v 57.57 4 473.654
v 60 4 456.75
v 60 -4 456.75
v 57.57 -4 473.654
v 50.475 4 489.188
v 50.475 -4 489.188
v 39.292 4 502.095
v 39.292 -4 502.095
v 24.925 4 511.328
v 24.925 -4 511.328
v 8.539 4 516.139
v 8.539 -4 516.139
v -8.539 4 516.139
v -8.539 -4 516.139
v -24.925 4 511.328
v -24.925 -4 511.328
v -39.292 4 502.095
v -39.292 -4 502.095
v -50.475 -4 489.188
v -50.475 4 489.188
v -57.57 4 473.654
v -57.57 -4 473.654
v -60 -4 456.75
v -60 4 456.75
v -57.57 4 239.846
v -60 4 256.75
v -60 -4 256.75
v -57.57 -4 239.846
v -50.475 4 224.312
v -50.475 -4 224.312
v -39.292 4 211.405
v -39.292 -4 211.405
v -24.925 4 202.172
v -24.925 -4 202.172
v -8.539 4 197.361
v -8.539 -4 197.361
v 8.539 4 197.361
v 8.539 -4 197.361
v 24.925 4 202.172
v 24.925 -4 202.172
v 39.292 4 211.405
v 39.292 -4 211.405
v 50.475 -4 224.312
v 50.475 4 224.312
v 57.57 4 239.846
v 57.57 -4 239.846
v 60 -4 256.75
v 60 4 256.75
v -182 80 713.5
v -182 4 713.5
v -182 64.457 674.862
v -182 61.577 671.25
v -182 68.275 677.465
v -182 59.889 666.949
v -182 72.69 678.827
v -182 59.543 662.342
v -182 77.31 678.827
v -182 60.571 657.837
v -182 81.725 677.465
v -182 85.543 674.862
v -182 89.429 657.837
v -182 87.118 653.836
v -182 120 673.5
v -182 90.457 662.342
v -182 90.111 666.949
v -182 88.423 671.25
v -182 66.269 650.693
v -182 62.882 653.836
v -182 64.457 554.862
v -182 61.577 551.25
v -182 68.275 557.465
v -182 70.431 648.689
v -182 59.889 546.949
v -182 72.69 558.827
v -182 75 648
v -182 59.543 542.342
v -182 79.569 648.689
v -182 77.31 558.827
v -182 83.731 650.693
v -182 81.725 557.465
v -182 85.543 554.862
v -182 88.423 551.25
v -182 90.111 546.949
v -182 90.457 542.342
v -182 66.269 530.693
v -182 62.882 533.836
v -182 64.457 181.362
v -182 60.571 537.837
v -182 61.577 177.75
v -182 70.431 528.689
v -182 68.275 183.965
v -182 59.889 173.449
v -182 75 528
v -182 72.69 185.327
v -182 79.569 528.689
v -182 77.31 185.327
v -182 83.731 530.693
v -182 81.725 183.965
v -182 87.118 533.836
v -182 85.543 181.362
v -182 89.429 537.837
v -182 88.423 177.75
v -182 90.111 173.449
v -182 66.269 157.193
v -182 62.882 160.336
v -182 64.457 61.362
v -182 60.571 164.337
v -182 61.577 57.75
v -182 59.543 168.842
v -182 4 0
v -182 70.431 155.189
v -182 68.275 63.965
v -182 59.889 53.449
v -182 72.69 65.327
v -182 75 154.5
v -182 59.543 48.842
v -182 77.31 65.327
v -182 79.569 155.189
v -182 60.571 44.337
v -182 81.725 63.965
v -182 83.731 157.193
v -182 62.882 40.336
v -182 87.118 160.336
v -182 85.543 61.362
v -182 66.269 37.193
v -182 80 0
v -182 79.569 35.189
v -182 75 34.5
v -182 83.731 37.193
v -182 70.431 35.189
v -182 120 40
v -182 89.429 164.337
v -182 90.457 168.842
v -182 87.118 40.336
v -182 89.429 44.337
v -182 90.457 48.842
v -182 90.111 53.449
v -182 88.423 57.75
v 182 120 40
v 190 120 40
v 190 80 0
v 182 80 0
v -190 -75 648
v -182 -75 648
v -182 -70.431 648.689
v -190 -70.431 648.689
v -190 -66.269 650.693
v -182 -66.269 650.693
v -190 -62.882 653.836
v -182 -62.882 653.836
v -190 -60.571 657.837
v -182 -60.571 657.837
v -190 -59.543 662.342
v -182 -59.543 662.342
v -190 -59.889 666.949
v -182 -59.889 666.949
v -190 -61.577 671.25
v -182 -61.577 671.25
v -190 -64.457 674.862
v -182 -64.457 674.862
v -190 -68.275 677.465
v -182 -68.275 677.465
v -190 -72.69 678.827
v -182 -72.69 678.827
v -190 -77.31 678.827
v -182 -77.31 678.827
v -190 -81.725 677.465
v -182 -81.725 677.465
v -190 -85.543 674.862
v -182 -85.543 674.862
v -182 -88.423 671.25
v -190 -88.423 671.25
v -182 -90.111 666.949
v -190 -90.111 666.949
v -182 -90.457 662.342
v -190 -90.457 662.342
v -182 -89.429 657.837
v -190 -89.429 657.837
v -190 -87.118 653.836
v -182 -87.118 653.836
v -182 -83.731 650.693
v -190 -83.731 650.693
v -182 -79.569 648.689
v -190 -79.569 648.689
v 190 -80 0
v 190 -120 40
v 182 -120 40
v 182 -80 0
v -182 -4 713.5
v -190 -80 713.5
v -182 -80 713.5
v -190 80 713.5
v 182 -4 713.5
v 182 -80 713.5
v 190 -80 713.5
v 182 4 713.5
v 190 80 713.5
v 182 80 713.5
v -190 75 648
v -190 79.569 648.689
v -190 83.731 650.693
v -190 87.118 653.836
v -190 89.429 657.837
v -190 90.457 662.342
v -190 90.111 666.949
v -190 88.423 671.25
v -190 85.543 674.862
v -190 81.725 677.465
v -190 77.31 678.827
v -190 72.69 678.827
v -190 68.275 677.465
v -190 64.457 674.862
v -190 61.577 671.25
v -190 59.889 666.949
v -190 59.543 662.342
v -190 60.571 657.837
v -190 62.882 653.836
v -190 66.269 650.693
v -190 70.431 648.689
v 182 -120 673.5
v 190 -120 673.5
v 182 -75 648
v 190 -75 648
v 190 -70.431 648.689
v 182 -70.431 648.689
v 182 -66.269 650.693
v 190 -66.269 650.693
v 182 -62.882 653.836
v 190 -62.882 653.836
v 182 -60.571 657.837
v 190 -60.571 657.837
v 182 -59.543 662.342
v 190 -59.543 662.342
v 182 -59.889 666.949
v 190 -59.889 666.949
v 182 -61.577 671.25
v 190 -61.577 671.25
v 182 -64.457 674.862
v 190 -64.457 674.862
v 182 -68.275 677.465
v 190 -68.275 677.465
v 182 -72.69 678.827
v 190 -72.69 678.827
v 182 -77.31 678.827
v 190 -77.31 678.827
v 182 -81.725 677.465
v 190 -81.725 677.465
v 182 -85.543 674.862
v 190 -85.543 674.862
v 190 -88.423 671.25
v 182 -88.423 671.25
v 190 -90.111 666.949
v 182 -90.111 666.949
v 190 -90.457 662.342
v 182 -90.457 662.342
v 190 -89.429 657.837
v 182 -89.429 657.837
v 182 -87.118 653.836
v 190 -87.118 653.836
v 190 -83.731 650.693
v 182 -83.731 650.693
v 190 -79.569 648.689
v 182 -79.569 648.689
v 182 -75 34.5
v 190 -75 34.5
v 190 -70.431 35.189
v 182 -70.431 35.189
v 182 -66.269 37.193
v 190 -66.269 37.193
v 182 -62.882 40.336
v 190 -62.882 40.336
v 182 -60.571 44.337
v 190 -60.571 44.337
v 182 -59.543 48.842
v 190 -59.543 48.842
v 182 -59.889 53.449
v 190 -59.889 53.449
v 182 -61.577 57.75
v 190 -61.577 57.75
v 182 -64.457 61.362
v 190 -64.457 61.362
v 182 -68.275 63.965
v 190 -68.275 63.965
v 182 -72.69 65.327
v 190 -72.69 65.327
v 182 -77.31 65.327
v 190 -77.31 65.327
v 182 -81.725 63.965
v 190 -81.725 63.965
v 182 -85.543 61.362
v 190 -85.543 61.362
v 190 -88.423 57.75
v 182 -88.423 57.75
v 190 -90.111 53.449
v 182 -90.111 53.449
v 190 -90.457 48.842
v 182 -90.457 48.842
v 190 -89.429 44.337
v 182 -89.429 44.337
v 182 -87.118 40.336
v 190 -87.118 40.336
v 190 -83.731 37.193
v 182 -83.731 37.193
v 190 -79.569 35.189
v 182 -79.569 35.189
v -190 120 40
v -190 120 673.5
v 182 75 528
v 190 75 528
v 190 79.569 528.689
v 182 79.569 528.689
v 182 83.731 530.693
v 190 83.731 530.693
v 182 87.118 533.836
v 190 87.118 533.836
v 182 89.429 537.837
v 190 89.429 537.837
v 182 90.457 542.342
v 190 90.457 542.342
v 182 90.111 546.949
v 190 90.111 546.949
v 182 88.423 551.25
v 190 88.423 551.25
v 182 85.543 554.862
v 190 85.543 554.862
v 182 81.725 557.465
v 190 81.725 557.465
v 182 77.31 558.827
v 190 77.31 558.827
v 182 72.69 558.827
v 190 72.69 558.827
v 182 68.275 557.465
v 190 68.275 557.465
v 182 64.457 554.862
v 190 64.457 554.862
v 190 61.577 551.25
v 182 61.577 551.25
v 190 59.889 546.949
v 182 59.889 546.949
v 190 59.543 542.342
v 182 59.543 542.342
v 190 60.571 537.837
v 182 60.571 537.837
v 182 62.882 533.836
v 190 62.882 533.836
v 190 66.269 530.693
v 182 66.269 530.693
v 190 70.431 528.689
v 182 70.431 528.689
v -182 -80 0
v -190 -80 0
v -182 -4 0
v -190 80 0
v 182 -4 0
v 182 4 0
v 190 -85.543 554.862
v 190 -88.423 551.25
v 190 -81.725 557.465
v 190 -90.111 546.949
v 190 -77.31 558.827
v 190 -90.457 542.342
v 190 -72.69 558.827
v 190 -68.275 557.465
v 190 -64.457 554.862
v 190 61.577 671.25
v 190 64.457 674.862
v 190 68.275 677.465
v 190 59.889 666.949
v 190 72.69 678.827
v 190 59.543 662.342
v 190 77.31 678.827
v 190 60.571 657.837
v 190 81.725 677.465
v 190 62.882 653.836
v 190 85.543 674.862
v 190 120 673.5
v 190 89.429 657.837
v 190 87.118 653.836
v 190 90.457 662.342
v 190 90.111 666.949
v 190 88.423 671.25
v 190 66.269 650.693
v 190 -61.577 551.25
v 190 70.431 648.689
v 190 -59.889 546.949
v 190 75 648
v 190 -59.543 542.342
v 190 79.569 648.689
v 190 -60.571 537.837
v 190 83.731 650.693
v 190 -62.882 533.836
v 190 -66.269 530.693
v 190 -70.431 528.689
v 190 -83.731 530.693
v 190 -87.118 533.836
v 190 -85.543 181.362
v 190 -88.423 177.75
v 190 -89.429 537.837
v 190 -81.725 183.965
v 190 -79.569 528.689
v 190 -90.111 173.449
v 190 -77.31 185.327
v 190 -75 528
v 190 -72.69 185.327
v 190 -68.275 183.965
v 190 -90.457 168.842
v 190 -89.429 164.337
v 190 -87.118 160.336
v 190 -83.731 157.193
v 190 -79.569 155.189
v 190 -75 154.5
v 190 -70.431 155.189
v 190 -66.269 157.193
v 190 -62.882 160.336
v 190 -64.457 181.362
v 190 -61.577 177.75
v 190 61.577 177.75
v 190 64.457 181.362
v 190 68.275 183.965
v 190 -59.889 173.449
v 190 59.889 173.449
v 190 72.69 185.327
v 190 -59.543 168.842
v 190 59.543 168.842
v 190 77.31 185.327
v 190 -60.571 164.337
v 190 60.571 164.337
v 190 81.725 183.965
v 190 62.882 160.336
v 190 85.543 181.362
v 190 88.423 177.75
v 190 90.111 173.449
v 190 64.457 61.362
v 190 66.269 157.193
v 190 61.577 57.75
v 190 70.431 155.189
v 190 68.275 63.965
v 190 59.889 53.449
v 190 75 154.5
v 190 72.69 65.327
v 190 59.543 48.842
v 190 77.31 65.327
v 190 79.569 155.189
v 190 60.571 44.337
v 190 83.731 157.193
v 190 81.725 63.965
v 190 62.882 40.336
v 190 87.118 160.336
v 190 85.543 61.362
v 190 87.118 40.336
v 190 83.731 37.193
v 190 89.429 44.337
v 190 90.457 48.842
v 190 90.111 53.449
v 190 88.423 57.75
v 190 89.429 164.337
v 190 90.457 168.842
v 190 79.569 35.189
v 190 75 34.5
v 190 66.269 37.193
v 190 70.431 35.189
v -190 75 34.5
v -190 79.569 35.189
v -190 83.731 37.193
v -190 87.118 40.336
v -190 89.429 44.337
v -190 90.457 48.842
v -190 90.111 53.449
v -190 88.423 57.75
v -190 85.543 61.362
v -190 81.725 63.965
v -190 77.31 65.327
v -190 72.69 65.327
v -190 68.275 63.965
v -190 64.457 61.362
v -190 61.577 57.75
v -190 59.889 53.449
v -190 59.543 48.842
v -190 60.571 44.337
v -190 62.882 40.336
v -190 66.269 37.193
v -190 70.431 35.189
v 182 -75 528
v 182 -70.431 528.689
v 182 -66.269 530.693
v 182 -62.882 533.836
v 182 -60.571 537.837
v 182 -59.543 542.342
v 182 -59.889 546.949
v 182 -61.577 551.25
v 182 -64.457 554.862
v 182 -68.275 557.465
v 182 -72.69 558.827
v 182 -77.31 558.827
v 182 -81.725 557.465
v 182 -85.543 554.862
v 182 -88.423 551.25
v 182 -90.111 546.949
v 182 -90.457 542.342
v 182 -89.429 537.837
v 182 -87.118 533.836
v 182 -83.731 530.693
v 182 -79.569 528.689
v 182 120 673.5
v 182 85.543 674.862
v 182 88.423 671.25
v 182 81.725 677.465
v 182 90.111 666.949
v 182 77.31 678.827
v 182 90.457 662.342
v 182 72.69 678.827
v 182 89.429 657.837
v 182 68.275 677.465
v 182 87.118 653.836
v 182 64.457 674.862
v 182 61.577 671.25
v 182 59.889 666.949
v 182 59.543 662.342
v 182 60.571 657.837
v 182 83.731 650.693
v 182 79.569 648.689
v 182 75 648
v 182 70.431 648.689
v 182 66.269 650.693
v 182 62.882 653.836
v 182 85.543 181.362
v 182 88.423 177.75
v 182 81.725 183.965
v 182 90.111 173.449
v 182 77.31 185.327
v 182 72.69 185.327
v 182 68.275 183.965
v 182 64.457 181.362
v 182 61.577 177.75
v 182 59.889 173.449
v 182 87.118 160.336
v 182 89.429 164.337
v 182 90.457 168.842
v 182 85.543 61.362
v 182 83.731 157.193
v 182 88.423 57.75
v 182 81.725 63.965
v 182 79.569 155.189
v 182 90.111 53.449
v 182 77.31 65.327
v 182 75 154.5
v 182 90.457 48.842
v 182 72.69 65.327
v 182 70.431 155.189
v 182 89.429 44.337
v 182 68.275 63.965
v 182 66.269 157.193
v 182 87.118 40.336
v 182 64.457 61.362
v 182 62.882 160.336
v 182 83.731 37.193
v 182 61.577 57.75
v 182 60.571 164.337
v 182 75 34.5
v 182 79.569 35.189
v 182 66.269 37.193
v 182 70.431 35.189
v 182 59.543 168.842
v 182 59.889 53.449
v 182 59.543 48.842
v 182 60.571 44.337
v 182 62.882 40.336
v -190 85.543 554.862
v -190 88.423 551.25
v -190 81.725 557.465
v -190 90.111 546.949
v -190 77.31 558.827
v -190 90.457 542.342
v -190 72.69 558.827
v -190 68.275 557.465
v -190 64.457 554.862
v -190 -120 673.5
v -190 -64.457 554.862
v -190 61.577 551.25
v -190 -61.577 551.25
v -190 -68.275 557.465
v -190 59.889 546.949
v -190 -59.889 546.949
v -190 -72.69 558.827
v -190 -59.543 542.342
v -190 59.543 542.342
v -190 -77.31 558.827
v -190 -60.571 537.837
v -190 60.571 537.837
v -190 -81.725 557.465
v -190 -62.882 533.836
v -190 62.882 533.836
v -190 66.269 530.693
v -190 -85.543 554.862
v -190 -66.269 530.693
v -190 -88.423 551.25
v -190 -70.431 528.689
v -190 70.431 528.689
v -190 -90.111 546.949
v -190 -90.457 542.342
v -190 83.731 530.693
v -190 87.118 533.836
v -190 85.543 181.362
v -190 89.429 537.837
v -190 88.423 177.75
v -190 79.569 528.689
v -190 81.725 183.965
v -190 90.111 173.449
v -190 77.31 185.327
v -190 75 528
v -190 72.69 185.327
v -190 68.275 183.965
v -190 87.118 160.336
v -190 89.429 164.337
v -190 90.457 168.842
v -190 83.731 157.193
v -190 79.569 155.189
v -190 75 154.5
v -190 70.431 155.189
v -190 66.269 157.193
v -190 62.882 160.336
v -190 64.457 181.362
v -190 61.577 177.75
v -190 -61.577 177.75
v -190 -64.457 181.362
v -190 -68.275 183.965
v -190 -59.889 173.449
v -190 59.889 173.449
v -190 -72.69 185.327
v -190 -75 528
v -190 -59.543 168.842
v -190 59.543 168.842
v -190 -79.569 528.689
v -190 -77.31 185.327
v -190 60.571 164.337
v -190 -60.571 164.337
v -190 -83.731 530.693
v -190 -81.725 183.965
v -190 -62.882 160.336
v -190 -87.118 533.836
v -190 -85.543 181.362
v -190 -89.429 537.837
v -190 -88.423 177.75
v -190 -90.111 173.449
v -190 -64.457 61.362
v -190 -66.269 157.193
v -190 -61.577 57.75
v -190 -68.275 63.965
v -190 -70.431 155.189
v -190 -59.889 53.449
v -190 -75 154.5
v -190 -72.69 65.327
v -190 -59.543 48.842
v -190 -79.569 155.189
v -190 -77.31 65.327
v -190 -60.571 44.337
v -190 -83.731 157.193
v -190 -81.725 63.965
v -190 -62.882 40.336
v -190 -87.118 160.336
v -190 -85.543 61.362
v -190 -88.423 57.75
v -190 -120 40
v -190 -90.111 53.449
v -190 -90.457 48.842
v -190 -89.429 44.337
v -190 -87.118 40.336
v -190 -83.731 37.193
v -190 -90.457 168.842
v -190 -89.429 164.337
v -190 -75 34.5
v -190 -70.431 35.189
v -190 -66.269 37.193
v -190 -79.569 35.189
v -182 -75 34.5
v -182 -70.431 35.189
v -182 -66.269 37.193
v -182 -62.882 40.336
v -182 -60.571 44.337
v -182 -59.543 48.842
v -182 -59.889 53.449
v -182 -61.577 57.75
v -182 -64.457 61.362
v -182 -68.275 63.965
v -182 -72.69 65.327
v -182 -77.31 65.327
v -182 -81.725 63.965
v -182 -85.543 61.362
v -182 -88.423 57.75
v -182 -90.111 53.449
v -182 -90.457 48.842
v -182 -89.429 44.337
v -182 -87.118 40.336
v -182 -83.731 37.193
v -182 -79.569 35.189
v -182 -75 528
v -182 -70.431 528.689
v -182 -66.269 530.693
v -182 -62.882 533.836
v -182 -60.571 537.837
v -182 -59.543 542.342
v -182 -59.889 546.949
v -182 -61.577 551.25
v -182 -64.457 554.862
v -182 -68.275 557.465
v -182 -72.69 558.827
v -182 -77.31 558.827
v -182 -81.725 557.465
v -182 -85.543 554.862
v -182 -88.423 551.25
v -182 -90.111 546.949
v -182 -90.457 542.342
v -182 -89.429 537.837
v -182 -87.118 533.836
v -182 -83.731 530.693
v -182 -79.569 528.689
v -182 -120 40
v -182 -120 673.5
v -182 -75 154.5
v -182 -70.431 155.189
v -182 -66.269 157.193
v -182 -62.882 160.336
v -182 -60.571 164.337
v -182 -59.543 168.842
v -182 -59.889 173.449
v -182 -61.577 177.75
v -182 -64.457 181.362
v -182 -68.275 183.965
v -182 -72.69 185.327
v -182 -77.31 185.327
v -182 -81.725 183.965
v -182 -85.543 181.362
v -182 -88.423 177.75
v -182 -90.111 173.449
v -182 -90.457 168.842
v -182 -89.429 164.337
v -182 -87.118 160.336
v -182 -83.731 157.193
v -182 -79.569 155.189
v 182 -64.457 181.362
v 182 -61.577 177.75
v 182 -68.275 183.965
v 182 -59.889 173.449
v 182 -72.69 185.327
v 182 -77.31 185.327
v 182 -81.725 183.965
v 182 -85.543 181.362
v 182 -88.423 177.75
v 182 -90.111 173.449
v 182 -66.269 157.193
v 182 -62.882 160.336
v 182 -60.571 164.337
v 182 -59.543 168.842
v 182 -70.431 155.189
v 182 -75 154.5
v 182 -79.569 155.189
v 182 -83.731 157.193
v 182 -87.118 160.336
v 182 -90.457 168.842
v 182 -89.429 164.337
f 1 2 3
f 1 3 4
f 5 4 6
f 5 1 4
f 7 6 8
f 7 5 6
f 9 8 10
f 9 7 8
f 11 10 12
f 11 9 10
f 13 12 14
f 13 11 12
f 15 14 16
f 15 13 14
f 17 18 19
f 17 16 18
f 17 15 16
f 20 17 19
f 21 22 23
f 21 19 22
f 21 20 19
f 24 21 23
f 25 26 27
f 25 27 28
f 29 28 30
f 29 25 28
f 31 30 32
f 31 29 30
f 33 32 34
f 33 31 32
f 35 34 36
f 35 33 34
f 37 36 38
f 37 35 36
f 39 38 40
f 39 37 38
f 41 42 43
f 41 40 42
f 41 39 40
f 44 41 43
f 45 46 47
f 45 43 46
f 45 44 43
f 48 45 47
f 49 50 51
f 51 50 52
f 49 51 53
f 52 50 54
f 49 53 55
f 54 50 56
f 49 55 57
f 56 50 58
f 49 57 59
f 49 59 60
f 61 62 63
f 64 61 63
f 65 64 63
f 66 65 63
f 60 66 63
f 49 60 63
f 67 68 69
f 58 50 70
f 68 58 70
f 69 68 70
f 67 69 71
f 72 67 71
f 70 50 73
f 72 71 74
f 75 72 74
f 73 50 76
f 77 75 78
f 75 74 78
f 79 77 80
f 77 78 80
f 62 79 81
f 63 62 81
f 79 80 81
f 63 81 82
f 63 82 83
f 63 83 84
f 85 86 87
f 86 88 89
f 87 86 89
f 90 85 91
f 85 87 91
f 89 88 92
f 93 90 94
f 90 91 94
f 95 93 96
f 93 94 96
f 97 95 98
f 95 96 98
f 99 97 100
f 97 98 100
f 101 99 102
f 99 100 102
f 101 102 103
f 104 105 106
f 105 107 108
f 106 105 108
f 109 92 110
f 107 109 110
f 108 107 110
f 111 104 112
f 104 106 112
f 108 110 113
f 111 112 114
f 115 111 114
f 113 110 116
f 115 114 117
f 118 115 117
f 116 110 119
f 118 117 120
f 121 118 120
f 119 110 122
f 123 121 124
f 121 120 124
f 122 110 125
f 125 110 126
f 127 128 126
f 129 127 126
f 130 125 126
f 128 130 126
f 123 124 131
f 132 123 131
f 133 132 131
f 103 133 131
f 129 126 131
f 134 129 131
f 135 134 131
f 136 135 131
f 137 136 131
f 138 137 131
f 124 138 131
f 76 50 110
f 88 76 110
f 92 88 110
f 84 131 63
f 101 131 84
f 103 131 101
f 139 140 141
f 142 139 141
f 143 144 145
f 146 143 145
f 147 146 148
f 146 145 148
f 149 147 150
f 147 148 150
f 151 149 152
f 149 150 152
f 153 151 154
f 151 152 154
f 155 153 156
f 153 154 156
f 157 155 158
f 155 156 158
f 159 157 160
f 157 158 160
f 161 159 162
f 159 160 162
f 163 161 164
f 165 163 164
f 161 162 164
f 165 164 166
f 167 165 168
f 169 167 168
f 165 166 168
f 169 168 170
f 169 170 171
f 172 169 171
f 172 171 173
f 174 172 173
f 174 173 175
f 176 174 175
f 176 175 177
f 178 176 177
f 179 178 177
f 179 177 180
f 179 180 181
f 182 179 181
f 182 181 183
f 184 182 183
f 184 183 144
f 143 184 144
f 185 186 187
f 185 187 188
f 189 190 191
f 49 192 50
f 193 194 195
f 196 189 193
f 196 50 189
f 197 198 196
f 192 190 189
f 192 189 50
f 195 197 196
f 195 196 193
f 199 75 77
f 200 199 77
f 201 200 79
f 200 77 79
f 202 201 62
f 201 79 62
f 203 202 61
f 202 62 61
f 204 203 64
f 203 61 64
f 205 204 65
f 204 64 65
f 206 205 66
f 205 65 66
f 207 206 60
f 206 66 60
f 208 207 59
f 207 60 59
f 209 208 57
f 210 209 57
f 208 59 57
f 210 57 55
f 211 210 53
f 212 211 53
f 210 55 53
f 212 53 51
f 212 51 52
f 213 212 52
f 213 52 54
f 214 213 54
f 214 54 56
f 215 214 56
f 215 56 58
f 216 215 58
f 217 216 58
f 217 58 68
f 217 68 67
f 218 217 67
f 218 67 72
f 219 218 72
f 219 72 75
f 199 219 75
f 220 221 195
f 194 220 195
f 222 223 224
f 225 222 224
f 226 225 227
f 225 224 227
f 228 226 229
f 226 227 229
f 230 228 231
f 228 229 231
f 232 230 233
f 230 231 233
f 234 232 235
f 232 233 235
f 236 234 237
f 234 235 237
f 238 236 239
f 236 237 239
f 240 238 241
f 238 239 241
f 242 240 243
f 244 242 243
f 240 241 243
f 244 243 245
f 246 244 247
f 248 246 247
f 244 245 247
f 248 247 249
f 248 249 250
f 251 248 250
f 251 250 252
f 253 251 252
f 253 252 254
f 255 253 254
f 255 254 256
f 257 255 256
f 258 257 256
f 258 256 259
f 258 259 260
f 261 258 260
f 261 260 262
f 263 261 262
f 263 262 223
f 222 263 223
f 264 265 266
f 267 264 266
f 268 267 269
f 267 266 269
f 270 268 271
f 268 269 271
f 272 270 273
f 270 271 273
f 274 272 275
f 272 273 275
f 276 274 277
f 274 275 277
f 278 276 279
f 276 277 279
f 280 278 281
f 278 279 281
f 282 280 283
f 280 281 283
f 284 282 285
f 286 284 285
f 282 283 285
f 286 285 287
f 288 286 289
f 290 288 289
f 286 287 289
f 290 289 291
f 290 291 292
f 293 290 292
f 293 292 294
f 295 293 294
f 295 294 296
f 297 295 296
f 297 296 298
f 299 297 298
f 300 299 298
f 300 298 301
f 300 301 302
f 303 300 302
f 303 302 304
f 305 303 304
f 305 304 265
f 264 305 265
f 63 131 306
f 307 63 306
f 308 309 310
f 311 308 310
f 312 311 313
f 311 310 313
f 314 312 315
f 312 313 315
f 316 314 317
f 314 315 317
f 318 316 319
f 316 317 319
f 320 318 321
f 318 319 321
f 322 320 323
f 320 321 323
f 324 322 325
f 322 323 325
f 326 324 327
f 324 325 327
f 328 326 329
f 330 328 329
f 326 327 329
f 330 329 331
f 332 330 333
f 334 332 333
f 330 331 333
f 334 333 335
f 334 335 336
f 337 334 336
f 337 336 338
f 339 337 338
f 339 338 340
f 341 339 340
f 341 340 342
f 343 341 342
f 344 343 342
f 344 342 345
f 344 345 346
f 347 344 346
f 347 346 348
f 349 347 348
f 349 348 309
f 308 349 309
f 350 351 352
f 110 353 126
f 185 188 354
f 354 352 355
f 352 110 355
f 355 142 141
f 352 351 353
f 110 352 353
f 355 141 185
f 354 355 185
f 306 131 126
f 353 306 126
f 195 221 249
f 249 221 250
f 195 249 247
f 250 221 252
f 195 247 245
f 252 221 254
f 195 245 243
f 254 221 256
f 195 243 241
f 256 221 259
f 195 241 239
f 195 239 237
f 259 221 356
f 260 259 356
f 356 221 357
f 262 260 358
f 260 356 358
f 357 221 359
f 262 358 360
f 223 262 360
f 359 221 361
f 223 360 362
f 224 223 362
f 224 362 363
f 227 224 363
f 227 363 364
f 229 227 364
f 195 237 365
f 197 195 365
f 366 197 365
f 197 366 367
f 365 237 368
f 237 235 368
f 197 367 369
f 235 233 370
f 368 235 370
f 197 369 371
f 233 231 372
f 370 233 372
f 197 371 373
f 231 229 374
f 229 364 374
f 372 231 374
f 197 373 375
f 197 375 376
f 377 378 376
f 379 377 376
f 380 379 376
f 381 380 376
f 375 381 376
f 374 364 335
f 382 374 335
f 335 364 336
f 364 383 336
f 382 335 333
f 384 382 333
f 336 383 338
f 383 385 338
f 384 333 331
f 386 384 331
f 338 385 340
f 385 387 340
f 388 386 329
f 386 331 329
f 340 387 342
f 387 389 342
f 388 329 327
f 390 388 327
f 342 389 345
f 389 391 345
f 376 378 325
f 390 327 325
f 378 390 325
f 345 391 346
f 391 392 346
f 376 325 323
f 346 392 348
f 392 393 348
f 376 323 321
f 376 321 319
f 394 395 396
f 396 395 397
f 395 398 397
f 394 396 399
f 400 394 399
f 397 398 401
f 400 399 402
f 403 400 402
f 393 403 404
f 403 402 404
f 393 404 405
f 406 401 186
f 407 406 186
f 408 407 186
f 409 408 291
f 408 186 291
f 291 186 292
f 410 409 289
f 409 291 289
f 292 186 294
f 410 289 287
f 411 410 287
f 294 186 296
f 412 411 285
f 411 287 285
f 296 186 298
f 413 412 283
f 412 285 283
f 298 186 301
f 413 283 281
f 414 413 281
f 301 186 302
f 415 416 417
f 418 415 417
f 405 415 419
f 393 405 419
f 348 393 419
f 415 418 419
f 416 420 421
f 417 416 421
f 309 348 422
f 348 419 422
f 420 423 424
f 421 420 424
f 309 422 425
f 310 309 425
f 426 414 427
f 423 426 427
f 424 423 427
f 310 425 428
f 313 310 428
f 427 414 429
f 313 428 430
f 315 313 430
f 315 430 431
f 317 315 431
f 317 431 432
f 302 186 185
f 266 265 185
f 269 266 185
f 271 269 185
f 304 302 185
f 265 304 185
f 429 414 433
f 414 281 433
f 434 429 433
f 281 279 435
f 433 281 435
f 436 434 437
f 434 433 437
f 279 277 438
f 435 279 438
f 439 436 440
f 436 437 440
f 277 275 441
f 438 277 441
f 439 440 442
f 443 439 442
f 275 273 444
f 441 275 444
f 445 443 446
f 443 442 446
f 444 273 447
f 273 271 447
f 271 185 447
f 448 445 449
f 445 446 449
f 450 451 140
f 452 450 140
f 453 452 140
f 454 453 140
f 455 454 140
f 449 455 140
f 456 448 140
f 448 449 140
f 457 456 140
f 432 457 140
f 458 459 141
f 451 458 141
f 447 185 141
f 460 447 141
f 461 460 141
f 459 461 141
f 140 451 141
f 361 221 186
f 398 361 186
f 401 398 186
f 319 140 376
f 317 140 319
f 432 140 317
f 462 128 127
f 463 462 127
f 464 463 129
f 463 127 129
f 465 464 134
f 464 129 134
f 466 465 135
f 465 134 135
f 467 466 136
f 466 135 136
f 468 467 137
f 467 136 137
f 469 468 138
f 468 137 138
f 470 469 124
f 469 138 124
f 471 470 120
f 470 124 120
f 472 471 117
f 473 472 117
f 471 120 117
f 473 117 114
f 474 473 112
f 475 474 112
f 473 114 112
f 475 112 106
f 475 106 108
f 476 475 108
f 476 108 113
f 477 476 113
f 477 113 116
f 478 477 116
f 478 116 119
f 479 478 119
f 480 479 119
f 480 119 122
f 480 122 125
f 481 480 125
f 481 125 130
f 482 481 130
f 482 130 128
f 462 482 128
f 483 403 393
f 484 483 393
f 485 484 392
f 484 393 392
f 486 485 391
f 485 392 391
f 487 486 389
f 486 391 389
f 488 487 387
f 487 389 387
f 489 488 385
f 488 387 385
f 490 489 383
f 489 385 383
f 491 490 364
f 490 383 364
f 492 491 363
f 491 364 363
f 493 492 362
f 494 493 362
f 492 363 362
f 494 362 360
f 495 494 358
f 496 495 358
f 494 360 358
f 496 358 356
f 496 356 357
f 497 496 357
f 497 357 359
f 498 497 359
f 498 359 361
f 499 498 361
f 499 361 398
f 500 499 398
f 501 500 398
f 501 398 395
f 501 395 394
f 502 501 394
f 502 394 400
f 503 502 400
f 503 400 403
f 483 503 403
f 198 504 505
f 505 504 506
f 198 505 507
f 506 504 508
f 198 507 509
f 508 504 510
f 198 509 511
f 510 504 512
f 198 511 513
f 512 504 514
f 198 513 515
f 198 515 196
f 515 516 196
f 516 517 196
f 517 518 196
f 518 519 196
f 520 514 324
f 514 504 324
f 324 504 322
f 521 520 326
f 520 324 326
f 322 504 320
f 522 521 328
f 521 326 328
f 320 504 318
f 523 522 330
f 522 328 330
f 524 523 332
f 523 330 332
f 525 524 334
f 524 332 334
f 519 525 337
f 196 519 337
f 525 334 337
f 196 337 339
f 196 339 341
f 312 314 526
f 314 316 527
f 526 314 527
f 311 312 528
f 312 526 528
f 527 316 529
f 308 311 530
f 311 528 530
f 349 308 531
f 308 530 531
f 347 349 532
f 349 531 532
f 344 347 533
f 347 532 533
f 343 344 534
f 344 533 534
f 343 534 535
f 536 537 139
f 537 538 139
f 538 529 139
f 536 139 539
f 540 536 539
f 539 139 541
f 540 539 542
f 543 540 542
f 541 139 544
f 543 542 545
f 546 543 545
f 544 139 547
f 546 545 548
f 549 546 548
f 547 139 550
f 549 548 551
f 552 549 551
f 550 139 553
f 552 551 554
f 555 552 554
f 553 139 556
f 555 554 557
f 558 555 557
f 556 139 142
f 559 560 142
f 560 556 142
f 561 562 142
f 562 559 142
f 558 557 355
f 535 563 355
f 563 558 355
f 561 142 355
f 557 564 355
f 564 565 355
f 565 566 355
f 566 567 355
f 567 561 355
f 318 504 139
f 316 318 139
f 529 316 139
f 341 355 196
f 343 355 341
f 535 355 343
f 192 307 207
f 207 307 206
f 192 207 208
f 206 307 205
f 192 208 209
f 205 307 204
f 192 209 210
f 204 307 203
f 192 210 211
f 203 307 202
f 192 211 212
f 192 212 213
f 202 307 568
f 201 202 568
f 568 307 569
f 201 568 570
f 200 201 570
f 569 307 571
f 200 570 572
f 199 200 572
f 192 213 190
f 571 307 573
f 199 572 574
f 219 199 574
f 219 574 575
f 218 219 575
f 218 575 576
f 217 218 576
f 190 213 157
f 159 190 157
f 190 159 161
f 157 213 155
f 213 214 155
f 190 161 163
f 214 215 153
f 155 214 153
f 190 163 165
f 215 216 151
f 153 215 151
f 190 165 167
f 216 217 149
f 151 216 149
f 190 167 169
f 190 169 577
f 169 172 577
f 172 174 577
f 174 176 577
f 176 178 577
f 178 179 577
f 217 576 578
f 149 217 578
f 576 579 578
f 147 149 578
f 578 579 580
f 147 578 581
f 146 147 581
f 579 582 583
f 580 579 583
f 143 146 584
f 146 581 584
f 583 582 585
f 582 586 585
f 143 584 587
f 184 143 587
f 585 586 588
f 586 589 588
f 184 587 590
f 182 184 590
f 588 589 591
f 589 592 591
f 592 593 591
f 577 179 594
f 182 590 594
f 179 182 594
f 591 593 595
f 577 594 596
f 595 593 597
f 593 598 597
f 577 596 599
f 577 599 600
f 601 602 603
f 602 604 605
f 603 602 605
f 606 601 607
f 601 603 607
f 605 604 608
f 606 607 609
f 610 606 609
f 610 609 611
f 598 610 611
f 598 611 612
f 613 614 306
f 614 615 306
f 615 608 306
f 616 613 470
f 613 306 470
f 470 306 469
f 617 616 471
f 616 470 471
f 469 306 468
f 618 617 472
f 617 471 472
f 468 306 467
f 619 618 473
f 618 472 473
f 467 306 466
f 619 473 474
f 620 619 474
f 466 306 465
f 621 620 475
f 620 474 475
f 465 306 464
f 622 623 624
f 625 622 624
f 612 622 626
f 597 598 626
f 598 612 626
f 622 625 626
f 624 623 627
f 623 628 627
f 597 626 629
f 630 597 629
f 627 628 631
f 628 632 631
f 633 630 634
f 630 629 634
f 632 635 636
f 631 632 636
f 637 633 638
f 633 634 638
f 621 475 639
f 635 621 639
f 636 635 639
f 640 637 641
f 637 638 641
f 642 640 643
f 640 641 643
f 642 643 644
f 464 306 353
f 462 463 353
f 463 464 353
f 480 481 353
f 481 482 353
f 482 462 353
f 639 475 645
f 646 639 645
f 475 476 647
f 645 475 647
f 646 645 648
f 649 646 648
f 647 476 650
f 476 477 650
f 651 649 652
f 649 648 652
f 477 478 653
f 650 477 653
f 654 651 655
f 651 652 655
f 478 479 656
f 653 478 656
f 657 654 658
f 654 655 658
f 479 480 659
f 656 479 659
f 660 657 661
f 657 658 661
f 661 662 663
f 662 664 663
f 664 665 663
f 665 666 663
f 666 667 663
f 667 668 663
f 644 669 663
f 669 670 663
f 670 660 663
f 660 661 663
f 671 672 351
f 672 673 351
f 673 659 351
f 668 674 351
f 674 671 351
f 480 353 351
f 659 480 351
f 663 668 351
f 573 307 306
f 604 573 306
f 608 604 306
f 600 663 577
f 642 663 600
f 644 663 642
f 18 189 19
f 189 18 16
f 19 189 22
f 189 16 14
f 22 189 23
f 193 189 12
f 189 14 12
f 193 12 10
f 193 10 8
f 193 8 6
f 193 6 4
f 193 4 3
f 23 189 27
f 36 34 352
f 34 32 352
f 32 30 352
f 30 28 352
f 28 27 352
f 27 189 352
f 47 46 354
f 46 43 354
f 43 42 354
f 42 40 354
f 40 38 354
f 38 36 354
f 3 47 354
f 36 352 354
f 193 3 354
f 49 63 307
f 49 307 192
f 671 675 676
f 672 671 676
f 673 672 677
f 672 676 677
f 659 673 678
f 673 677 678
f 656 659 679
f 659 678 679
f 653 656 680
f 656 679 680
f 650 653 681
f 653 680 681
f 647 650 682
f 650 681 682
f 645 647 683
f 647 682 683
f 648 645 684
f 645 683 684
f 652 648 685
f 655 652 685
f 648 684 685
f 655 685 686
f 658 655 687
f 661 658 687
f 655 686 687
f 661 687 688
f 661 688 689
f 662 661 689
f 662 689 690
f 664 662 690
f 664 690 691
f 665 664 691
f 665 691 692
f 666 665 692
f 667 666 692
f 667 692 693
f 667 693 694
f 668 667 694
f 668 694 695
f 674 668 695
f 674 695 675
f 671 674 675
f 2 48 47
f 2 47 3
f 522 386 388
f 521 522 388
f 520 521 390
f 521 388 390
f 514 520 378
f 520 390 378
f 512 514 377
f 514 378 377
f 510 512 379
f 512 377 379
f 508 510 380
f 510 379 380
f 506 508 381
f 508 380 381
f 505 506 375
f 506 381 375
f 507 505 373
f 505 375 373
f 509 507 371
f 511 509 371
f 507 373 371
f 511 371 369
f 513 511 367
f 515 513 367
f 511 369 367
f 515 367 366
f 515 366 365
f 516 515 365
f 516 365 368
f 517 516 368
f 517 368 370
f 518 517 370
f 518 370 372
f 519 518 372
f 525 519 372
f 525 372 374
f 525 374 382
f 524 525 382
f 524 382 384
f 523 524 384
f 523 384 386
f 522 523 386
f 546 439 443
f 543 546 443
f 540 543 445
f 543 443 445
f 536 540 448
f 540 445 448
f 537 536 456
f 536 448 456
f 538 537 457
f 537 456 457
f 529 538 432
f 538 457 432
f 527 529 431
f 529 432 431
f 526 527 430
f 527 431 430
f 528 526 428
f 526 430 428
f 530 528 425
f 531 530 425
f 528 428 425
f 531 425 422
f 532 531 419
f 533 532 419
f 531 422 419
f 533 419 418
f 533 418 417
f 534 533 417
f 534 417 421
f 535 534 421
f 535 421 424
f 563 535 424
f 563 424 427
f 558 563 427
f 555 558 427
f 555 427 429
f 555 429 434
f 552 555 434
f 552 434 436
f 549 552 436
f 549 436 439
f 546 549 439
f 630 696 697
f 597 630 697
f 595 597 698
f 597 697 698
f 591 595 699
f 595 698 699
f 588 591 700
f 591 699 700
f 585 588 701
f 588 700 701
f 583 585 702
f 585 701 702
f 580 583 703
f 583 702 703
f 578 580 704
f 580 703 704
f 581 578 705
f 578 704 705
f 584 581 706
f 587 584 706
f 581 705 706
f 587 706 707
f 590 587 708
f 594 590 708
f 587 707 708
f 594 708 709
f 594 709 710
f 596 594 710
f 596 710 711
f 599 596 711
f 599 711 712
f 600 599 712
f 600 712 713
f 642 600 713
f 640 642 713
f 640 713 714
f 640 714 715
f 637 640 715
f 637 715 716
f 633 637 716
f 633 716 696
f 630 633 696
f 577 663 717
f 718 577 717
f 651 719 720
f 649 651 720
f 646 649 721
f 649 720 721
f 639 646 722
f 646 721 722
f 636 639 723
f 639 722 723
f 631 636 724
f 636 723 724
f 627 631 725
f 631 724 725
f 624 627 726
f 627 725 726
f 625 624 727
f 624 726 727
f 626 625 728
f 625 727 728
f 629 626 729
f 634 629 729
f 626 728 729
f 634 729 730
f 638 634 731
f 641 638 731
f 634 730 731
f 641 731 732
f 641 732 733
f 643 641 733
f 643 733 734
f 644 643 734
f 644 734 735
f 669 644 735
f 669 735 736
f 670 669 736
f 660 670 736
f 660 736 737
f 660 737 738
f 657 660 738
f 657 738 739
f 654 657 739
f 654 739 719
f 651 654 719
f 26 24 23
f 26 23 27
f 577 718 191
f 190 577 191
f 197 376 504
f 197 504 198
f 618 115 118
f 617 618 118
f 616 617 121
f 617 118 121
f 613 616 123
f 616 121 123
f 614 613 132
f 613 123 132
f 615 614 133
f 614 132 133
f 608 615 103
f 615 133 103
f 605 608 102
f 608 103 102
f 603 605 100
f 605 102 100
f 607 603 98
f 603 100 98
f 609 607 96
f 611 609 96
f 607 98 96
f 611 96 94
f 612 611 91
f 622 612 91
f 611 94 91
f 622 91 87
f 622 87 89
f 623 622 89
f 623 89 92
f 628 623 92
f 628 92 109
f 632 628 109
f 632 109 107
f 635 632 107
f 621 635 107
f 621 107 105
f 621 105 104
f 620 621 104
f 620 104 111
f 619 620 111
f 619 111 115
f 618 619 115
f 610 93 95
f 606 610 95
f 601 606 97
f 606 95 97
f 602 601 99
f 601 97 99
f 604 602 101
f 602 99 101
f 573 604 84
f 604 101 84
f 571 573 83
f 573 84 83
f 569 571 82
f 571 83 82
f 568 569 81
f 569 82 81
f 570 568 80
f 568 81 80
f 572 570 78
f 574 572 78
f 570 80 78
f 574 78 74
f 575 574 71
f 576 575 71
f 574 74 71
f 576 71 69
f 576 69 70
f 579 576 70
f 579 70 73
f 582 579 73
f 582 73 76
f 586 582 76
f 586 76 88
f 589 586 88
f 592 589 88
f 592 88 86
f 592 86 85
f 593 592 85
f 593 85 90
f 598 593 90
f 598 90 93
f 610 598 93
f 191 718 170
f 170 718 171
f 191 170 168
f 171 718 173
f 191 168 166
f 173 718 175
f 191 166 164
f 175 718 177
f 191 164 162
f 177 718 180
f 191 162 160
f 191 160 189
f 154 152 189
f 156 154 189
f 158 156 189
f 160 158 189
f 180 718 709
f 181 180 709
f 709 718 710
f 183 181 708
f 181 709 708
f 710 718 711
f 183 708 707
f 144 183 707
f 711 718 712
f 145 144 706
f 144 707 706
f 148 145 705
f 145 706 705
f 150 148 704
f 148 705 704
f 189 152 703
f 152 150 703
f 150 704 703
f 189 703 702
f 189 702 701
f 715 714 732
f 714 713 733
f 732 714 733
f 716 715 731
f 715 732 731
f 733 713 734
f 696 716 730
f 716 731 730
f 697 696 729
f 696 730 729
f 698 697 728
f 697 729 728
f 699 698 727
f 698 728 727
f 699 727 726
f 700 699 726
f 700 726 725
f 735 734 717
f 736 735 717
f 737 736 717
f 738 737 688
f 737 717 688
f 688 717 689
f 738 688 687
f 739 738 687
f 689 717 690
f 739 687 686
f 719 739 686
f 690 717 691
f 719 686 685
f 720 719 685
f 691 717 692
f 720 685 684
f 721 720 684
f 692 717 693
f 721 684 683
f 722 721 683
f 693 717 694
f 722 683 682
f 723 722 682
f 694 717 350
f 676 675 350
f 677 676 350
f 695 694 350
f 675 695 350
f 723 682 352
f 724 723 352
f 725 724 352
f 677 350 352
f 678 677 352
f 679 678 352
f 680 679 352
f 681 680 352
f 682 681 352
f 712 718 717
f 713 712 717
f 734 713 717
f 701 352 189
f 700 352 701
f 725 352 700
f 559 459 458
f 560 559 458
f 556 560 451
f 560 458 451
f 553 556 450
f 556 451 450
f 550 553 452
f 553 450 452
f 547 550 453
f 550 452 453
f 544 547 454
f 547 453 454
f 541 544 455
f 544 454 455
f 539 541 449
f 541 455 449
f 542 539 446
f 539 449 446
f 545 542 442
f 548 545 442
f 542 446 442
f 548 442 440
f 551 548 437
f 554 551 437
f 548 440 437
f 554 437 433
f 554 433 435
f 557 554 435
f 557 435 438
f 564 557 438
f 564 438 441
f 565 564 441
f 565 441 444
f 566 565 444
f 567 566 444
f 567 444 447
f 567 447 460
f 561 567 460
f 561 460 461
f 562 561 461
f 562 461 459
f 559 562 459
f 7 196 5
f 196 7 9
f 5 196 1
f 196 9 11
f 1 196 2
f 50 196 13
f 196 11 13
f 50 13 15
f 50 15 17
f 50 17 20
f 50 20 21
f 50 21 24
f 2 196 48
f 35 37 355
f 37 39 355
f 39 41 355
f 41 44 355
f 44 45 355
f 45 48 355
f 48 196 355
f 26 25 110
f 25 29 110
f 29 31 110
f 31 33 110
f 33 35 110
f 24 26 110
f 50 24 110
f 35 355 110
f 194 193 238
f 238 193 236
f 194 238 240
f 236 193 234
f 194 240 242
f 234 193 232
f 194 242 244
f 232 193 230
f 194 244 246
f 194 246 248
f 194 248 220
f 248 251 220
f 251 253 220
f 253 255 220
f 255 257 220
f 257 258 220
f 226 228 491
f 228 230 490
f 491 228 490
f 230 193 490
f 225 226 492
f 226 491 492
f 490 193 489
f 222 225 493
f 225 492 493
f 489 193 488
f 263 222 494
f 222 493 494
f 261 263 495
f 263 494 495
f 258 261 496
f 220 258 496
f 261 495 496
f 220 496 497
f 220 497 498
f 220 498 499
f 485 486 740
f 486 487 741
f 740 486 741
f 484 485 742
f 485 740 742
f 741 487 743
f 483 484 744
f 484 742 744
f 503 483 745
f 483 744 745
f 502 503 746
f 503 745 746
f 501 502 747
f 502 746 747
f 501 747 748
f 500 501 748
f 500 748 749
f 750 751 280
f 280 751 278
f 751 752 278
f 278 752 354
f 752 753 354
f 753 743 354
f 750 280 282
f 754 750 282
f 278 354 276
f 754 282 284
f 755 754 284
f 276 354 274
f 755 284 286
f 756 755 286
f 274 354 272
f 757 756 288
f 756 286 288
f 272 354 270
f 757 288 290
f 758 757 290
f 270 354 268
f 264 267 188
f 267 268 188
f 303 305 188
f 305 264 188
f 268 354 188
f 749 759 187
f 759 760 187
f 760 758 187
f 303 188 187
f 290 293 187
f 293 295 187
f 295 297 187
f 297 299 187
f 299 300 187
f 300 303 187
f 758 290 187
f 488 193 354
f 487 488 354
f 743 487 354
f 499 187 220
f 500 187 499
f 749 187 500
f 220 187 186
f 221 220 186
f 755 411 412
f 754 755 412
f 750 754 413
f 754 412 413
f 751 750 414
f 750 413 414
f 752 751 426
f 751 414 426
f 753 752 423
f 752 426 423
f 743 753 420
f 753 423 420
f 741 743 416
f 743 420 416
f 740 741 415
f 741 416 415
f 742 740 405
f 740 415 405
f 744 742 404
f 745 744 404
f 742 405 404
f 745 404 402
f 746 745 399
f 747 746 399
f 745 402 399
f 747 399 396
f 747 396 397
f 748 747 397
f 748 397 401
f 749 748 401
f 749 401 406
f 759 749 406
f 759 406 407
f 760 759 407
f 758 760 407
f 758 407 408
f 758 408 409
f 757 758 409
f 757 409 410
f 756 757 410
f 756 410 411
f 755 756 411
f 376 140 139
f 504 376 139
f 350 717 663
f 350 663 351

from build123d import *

# Parameters (mm, degrees)
EXTRUDE_1_DEPTH     = 713.5
SKETCH_2_R          = 15.5
CUT_EXTRUDE_2_DEPTH = 818.240631638
CUT_EXTRUDE_3_DEPTH = 749.704380914


with BuildPart() as part:
    # 草图1 → 拉伸1 (new body)
    with BuildSketch(Plane.XY):
        Polygon((-182, 120), (-190, 120), (-190, -120), (-182, -120), (-182, -4), (182, -4), (182, -120), (190, -120), (190, 120), (182, 120), (182, 4), (-182, 4), align=None)
    extrude(amount=EXTRUDE_1_DEPTH)

    # 草图2 → 拉伸2 (cut, through all)
    with BuildSketch(Plane(origin=(190, 0, 0), x_dir=(0, 0, -1), z_dir=(1, 0, 0))):
        with Locations((-663.5, 75)):
            Circle(SKETCH_2_R)
        with Locations((-543.5, 75)):
            Circle(SKETCH_2_R)
        with Locations((-663.5, -75)):
            Circle(SKETCH_2_R)
        with Locations((-543.5, -75)):
            Circle(SKETCH_2_R)
        with Locations((-170, 75)):
            Circle(SKETCH_2_R)
        with Locations((-50, 75)):
            Circle(SKETCH_2_R)
        with Locations((-50, -75)):
            Circle(SKETCH_2_R)
        with Locations((-170, -75)):
            Circle(SKETCH_2_R)
        Polygon((-673.5, 120), (-713.5, 80), (-713.5, 120), align=None)
        Polygon((-40, 120), (0, 80), (0, 120), align=None)
        Polygon((-40, -120), (0, -80), (0, -120), align=None)
        Polygon((-673.5, -120), (-713.5, -80), (-713.5, -120), align=None)
    extrude(amount=-CUT_EXTRUDE_2_DEPTH, mode=Mode.SUBTRACT)

    # 草图3 → 拉伸3 (cut, through all)
    with BuildSketch(Plane(origin=(0, 4, 0), x_dir=(1, 0, 0), z_dir=(0, 1, 0))):
        with BuildLine():
            Line((60, -256.75), (60, -456.75))
            ThreePointArc((60, -456.75), (0, -516.75), (-60, -456.75))
            Line((-60, -456.75), (-60, -256.75))
            ThreePointArc((-60, -256.75), (0, -196.75), (60, -256.75))
        make_face()
    extrude(amount=-CUT_EXTRUDE_3_DEPTH, mode=Mode.SUBTRACT)


solid = part.part
